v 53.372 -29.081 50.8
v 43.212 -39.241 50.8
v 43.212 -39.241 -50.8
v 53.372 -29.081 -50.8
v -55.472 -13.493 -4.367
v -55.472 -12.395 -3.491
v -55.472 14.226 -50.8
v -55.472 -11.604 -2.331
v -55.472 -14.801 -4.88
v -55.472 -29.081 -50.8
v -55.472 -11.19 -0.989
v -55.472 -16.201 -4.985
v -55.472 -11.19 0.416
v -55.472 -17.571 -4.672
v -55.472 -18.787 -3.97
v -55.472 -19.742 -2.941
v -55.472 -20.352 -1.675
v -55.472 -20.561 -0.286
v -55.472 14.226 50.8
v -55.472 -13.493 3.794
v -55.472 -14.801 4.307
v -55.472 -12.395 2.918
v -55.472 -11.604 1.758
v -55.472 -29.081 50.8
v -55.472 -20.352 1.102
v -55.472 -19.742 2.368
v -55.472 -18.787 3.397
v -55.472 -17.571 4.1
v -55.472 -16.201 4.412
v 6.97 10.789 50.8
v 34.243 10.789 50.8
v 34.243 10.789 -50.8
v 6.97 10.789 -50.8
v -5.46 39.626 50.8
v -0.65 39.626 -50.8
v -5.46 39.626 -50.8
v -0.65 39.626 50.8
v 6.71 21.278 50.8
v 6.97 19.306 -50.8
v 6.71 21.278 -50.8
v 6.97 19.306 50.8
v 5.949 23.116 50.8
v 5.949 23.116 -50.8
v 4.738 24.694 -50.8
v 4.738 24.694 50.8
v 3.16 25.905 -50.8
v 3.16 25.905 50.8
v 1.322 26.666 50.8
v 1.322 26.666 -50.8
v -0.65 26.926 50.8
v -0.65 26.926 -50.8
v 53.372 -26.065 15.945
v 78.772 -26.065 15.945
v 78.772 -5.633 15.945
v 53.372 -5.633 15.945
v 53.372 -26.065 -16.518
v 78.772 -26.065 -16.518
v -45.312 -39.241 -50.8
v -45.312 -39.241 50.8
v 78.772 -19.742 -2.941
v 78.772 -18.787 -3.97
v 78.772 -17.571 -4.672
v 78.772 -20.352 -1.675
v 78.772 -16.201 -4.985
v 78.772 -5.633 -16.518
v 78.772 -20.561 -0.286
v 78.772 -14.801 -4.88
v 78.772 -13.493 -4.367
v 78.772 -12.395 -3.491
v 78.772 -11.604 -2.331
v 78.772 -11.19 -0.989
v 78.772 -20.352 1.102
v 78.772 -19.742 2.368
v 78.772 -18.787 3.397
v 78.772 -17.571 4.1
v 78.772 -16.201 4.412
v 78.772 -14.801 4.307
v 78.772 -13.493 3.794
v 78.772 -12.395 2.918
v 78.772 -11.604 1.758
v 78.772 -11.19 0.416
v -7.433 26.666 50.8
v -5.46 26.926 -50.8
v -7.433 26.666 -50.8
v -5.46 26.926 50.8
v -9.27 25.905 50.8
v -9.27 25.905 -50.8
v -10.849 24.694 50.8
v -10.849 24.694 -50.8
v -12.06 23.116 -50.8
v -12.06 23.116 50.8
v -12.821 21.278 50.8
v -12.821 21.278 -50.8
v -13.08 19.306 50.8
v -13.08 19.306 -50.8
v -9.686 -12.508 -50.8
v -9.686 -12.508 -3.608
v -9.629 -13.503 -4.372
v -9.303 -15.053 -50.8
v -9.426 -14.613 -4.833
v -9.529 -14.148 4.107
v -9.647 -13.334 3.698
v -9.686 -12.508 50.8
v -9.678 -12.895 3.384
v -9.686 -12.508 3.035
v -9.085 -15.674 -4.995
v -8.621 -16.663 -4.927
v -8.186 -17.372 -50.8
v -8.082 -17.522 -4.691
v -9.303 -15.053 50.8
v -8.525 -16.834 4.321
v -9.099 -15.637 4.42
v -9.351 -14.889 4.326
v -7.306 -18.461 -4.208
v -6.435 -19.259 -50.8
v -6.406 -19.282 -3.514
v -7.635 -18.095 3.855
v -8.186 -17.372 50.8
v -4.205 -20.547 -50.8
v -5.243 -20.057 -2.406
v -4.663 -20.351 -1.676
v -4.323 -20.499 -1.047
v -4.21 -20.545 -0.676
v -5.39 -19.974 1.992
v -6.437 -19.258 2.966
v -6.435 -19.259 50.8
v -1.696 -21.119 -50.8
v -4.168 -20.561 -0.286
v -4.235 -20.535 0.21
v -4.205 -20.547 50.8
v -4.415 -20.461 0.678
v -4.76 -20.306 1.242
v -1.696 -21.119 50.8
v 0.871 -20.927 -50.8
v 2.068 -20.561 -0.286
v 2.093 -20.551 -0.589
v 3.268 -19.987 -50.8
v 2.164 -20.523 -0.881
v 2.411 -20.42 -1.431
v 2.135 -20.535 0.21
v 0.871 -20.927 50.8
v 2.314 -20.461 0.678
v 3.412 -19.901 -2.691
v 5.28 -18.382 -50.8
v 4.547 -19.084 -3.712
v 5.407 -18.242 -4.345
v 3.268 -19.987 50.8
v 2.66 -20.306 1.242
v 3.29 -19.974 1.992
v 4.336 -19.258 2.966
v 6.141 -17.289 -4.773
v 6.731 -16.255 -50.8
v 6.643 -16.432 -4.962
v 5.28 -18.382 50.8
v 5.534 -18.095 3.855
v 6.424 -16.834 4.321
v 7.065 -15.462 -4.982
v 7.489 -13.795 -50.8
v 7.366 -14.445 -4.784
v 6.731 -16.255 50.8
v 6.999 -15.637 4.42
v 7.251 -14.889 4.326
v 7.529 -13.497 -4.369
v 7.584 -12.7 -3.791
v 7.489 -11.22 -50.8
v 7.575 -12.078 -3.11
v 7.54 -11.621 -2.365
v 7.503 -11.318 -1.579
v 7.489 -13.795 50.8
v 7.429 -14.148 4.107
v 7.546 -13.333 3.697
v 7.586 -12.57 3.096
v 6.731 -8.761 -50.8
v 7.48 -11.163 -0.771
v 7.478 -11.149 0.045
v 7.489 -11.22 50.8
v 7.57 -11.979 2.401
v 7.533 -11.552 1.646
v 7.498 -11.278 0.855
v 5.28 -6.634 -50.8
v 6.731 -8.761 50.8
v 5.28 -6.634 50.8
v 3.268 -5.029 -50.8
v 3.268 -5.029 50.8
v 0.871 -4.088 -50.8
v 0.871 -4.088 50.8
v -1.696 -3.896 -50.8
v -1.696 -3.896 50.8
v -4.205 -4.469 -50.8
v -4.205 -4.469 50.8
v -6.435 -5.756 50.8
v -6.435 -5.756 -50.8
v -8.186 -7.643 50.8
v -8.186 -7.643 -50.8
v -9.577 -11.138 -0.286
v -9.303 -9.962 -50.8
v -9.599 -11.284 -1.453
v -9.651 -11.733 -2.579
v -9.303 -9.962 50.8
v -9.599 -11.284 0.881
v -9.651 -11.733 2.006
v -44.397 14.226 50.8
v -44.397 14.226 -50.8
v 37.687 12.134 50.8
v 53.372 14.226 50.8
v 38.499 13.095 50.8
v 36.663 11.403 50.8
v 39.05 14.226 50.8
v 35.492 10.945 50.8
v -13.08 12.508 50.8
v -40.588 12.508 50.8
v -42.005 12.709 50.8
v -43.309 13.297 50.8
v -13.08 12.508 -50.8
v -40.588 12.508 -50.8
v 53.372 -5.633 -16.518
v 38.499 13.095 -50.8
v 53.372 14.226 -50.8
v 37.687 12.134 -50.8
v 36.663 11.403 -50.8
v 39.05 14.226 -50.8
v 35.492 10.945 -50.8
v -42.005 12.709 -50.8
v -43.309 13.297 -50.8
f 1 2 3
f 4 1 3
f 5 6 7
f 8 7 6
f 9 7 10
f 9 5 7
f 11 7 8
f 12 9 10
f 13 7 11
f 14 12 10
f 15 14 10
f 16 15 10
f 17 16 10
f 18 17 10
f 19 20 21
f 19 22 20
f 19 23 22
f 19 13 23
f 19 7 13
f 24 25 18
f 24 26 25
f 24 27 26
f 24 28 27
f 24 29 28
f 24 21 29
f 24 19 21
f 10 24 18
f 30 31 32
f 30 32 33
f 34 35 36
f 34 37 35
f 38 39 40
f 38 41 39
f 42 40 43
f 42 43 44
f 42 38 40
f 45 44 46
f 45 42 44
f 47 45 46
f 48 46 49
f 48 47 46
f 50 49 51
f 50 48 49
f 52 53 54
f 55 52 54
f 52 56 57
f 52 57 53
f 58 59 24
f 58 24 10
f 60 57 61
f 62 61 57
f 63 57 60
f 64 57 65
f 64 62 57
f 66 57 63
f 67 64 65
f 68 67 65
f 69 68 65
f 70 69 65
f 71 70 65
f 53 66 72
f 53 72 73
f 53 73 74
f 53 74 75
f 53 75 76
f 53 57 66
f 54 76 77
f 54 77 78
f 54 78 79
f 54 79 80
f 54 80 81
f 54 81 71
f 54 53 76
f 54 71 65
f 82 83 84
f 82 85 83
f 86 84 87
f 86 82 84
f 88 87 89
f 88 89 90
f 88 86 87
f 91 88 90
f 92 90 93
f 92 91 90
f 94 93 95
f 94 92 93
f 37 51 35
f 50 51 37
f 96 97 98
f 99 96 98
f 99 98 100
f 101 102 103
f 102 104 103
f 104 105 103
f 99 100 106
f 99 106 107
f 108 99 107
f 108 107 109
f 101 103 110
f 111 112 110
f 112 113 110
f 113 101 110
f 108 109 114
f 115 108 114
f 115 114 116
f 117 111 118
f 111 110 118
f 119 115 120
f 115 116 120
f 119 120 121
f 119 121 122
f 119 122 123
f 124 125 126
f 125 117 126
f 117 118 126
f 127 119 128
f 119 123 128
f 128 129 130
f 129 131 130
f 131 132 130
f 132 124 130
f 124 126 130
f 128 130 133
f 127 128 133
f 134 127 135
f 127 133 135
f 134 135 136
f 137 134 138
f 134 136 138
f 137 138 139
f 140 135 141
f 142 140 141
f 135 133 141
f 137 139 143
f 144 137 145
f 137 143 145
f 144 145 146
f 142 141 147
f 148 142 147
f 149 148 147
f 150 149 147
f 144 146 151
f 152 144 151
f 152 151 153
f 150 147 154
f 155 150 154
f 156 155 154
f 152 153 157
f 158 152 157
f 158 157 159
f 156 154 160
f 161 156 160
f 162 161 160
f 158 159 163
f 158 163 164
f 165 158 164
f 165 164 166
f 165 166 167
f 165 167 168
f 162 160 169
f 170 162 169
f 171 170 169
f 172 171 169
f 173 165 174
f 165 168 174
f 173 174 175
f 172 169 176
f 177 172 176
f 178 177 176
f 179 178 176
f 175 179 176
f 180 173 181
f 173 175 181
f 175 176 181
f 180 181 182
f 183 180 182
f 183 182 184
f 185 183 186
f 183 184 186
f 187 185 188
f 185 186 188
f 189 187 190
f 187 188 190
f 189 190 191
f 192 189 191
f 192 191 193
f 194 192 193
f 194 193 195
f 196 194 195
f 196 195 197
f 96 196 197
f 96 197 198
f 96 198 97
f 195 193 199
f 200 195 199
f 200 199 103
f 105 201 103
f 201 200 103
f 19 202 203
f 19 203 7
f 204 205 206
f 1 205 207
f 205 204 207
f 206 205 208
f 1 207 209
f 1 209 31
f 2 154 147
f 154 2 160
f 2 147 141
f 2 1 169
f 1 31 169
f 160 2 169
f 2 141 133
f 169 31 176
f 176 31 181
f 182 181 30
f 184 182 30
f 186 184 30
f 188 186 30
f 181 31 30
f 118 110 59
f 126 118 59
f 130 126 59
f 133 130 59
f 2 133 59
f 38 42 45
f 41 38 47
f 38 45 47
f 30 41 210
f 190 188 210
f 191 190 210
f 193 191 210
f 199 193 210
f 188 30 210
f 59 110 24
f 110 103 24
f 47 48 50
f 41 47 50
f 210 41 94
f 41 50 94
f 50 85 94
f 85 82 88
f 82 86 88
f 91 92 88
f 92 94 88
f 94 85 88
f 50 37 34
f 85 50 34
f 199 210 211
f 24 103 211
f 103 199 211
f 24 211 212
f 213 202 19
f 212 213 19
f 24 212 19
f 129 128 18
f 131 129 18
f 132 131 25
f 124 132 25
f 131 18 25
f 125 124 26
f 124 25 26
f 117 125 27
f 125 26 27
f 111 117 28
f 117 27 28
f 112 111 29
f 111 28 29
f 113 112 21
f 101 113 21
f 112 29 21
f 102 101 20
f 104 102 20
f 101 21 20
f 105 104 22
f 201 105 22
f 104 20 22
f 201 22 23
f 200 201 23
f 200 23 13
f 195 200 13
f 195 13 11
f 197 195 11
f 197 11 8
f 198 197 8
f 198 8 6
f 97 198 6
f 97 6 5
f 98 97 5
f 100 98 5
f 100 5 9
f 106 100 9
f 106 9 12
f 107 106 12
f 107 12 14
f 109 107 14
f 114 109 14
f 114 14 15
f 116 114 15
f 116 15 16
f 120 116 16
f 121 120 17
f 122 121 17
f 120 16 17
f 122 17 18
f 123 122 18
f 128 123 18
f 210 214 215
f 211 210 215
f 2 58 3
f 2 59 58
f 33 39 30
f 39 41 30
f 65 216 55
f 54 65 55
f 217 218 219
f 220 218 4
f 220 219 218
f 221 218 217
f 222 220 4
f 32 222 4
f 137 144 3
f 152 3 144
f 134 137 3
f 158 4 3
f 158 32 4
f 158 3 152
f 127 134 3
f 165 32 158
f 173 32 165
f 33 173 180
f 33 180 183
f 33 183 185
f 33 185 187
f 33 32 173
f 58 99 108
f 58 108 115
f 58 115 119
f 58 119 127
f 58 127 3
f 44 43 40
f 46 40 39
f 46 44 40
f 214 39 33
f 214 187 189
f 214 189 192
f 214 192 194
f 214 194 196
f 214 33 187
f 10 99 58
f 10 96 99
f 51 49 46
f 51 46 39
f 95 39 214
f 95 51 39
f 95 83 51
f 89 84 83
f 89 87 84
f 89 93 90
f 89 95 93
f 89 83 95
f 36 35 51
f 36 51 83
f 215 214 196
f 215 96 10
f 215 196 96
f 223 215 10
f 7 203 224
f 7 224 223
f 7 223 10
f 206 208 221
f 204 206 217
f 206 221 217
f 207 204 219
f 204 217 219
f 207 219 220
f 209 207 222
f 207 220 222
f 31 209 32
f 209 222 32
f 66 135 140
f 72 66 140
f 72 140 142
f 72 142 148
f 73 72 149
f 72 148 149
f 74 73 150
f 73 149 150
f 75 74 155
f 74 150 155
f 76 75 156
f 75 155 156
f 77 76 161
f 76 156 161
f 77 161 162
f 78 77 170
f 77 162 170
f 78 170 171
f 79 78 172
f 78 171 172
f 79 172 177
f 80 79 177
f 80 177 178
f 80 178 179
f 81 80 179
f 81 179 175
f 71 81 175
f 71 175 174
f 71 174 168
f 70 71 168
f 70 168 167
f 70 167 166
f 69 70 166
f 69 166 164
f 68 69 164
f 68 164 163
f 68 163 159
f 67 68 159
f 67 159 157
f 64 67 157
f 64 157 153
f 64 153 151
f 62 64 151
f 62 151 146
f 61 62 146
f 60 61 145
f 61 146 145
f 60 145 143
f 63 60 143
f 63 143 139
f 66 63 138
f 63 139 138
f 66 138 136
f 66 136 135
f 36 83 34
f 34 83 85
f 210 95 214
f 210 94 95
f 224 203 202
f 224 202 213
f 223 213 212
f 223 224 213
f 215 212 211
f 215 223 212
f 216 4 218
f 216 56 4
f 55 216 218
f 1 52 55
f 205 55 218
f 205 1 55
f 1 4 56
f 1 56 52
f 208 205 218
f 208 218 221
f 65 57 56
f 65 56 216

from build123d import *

# Parameters (mm, degrees)
F1_DEPTH     = 50.8
F2_DEPTH     = 12.7
F4_D         = 17.272
F5_DEPTH     = 76.2
F6_DEPTH     = 76.2
F7_W         = 20.4321481287
F7_H         = 32.4622914195
F8_DEPTH     = 25.4
F9_R         = 7.62
F10_SIZE     = 10.16
F12_D        = 9.4234
F13_DEPTH    = 12.7
F14_T1_DEPTH = 101.6


# Not quite as in the source:
# - a fillet or chamfer that OpenCascade refuses, or shapes differently, is made with other operations: its cross-section is extruded or revolved along the edge and cut away or added


with BuildPart() as f1:
    # F0 (on Top) → F1 (new body, symmetric)
    with BuildSketch(Plane.XY):
        Polygon((-44.3969555199, 12.5075299293), (-44.3969555199, 14.226121828), (-55.4723292589, 14.226121828), (-55.4723292589, -39.2411798239), (53.3718280494, -39.2411798239), (53.3718280494, 14.226121828), (39.0502288938, 14.226121828), (39.0502288938, 10.7889380306), (6.9698439911, 10.7889380306), (6.9698439911, 14.226121828), (-13.0803938955, 14.226121828), (-13.0803938955, 12.5075299293), align=None)
    extrude(amount=F1_DEPTH, both=True)

    # F2 (add): a face of the model
    f2_faces = [f1.faces().sort_by_distance(p)[0] for p in [
        (-3.0552749522, 14.226121828, 0),
    ]]
    extrude(f2_faces, amount=F2_DEPTH)

    # F4 (through all)
    with Locations(Plane(origin=(0, 0, -50.8), x_dir=(1, 0, 0), z_dir=(0, 0, -1))):
        with Locations((-1.0502506047, 12.507528998)):
            Hole(F4_D / 2)

    # F5 (add): a face of the model
    f5_faces = [f1.faces().sort_by_distance(p)[0] for p in [
        (-45.6707358145, 13.3668258786, 50.8),
    ]]
    extrude(f5_faces, amount=-F5_DEPTH)

    # F6 (add): a face of the model
    f6_faces = [f1.faces().sort_by_distance(p)[0] for p in [
        (-45.6707358145, 13.3668258786, 50.8),
    ]]
    extrude(f6_faces, amount=-F6_DEPTH)

    # F7 (on face) → F8 (join)
    with BuildSketch(Plane.YZ.offset(53.3718280494)):
        with Locations((-15.8492363989, -0.2864319831)):
            Rectangle(F7_W, F7_H)
    extrude(amount=F8_DEPTH)

    # F9
    f9_edges = [f1.edges().sort_by_distance(p)[0] for p in [
        (-13.080394, 26.926122, 0),
        (6.969844, 26.926122, 0),
    ]]
    fillet(f9_edges, radius=F9_R)

    # F10
    f10_edges = [f1.edges().sort_by_distance(p)[0] for p in [
        (53.371828, -39.24118, 0),
        (-55.472329, -39.24118, 0),
    ]]
    chamfer(f10_edges, length=F10_SIZE)

    # F12 (through all)
    with Locations(Plane.YZ.offset(78.7718280494)):
        with Locations((-15.8492363989, -0.2864319831)):
            Hole(F12_D / 2)

    # F13 (add): a face of the model
    f13_faces = [f1.faces().sort_by_distance(p)[0] for p in [
        (-3.0552749522, 26.926121828, 0),
    ]]
    extrude(f13_faces, amount=F13_DEPTH)

    # F14: fillet of radius 5.08 on 2 edges, made by hand

    # F14_s2 → F14_t1 (join)
    with BuildSketch(Plane.XY.offset(-50.8)):
        with BuildLine():
            ThreePointArc((-44.3969555199, 14.226121828), (-42.6774175907, 12.9570681189), (-40.5881058804, 12.5075299293))
            Line((-40.5881058804, 12.5075299293), (-44.3969555199, 12.5075299293))
            Line((-44.3969555199, 12.5075299293), (-44.3969555199, 14.226121828))
        make_face()
        with BuildLine():
            ThreePointArc((39.0502288938, 14.226121828), (37.1979300298, 11.7366319971), (34.2431970731, 10.7889380306))
            Line((34.2431970731, 10.7889380306), (39.0502288938, 10.7889380306))
            Line((39.0502288938, 10.7889380306), (39.0502288938, 14.226121828))
        make_face()
    extrude(amount=F14_T1_DEPTH)


solid = f1.part
